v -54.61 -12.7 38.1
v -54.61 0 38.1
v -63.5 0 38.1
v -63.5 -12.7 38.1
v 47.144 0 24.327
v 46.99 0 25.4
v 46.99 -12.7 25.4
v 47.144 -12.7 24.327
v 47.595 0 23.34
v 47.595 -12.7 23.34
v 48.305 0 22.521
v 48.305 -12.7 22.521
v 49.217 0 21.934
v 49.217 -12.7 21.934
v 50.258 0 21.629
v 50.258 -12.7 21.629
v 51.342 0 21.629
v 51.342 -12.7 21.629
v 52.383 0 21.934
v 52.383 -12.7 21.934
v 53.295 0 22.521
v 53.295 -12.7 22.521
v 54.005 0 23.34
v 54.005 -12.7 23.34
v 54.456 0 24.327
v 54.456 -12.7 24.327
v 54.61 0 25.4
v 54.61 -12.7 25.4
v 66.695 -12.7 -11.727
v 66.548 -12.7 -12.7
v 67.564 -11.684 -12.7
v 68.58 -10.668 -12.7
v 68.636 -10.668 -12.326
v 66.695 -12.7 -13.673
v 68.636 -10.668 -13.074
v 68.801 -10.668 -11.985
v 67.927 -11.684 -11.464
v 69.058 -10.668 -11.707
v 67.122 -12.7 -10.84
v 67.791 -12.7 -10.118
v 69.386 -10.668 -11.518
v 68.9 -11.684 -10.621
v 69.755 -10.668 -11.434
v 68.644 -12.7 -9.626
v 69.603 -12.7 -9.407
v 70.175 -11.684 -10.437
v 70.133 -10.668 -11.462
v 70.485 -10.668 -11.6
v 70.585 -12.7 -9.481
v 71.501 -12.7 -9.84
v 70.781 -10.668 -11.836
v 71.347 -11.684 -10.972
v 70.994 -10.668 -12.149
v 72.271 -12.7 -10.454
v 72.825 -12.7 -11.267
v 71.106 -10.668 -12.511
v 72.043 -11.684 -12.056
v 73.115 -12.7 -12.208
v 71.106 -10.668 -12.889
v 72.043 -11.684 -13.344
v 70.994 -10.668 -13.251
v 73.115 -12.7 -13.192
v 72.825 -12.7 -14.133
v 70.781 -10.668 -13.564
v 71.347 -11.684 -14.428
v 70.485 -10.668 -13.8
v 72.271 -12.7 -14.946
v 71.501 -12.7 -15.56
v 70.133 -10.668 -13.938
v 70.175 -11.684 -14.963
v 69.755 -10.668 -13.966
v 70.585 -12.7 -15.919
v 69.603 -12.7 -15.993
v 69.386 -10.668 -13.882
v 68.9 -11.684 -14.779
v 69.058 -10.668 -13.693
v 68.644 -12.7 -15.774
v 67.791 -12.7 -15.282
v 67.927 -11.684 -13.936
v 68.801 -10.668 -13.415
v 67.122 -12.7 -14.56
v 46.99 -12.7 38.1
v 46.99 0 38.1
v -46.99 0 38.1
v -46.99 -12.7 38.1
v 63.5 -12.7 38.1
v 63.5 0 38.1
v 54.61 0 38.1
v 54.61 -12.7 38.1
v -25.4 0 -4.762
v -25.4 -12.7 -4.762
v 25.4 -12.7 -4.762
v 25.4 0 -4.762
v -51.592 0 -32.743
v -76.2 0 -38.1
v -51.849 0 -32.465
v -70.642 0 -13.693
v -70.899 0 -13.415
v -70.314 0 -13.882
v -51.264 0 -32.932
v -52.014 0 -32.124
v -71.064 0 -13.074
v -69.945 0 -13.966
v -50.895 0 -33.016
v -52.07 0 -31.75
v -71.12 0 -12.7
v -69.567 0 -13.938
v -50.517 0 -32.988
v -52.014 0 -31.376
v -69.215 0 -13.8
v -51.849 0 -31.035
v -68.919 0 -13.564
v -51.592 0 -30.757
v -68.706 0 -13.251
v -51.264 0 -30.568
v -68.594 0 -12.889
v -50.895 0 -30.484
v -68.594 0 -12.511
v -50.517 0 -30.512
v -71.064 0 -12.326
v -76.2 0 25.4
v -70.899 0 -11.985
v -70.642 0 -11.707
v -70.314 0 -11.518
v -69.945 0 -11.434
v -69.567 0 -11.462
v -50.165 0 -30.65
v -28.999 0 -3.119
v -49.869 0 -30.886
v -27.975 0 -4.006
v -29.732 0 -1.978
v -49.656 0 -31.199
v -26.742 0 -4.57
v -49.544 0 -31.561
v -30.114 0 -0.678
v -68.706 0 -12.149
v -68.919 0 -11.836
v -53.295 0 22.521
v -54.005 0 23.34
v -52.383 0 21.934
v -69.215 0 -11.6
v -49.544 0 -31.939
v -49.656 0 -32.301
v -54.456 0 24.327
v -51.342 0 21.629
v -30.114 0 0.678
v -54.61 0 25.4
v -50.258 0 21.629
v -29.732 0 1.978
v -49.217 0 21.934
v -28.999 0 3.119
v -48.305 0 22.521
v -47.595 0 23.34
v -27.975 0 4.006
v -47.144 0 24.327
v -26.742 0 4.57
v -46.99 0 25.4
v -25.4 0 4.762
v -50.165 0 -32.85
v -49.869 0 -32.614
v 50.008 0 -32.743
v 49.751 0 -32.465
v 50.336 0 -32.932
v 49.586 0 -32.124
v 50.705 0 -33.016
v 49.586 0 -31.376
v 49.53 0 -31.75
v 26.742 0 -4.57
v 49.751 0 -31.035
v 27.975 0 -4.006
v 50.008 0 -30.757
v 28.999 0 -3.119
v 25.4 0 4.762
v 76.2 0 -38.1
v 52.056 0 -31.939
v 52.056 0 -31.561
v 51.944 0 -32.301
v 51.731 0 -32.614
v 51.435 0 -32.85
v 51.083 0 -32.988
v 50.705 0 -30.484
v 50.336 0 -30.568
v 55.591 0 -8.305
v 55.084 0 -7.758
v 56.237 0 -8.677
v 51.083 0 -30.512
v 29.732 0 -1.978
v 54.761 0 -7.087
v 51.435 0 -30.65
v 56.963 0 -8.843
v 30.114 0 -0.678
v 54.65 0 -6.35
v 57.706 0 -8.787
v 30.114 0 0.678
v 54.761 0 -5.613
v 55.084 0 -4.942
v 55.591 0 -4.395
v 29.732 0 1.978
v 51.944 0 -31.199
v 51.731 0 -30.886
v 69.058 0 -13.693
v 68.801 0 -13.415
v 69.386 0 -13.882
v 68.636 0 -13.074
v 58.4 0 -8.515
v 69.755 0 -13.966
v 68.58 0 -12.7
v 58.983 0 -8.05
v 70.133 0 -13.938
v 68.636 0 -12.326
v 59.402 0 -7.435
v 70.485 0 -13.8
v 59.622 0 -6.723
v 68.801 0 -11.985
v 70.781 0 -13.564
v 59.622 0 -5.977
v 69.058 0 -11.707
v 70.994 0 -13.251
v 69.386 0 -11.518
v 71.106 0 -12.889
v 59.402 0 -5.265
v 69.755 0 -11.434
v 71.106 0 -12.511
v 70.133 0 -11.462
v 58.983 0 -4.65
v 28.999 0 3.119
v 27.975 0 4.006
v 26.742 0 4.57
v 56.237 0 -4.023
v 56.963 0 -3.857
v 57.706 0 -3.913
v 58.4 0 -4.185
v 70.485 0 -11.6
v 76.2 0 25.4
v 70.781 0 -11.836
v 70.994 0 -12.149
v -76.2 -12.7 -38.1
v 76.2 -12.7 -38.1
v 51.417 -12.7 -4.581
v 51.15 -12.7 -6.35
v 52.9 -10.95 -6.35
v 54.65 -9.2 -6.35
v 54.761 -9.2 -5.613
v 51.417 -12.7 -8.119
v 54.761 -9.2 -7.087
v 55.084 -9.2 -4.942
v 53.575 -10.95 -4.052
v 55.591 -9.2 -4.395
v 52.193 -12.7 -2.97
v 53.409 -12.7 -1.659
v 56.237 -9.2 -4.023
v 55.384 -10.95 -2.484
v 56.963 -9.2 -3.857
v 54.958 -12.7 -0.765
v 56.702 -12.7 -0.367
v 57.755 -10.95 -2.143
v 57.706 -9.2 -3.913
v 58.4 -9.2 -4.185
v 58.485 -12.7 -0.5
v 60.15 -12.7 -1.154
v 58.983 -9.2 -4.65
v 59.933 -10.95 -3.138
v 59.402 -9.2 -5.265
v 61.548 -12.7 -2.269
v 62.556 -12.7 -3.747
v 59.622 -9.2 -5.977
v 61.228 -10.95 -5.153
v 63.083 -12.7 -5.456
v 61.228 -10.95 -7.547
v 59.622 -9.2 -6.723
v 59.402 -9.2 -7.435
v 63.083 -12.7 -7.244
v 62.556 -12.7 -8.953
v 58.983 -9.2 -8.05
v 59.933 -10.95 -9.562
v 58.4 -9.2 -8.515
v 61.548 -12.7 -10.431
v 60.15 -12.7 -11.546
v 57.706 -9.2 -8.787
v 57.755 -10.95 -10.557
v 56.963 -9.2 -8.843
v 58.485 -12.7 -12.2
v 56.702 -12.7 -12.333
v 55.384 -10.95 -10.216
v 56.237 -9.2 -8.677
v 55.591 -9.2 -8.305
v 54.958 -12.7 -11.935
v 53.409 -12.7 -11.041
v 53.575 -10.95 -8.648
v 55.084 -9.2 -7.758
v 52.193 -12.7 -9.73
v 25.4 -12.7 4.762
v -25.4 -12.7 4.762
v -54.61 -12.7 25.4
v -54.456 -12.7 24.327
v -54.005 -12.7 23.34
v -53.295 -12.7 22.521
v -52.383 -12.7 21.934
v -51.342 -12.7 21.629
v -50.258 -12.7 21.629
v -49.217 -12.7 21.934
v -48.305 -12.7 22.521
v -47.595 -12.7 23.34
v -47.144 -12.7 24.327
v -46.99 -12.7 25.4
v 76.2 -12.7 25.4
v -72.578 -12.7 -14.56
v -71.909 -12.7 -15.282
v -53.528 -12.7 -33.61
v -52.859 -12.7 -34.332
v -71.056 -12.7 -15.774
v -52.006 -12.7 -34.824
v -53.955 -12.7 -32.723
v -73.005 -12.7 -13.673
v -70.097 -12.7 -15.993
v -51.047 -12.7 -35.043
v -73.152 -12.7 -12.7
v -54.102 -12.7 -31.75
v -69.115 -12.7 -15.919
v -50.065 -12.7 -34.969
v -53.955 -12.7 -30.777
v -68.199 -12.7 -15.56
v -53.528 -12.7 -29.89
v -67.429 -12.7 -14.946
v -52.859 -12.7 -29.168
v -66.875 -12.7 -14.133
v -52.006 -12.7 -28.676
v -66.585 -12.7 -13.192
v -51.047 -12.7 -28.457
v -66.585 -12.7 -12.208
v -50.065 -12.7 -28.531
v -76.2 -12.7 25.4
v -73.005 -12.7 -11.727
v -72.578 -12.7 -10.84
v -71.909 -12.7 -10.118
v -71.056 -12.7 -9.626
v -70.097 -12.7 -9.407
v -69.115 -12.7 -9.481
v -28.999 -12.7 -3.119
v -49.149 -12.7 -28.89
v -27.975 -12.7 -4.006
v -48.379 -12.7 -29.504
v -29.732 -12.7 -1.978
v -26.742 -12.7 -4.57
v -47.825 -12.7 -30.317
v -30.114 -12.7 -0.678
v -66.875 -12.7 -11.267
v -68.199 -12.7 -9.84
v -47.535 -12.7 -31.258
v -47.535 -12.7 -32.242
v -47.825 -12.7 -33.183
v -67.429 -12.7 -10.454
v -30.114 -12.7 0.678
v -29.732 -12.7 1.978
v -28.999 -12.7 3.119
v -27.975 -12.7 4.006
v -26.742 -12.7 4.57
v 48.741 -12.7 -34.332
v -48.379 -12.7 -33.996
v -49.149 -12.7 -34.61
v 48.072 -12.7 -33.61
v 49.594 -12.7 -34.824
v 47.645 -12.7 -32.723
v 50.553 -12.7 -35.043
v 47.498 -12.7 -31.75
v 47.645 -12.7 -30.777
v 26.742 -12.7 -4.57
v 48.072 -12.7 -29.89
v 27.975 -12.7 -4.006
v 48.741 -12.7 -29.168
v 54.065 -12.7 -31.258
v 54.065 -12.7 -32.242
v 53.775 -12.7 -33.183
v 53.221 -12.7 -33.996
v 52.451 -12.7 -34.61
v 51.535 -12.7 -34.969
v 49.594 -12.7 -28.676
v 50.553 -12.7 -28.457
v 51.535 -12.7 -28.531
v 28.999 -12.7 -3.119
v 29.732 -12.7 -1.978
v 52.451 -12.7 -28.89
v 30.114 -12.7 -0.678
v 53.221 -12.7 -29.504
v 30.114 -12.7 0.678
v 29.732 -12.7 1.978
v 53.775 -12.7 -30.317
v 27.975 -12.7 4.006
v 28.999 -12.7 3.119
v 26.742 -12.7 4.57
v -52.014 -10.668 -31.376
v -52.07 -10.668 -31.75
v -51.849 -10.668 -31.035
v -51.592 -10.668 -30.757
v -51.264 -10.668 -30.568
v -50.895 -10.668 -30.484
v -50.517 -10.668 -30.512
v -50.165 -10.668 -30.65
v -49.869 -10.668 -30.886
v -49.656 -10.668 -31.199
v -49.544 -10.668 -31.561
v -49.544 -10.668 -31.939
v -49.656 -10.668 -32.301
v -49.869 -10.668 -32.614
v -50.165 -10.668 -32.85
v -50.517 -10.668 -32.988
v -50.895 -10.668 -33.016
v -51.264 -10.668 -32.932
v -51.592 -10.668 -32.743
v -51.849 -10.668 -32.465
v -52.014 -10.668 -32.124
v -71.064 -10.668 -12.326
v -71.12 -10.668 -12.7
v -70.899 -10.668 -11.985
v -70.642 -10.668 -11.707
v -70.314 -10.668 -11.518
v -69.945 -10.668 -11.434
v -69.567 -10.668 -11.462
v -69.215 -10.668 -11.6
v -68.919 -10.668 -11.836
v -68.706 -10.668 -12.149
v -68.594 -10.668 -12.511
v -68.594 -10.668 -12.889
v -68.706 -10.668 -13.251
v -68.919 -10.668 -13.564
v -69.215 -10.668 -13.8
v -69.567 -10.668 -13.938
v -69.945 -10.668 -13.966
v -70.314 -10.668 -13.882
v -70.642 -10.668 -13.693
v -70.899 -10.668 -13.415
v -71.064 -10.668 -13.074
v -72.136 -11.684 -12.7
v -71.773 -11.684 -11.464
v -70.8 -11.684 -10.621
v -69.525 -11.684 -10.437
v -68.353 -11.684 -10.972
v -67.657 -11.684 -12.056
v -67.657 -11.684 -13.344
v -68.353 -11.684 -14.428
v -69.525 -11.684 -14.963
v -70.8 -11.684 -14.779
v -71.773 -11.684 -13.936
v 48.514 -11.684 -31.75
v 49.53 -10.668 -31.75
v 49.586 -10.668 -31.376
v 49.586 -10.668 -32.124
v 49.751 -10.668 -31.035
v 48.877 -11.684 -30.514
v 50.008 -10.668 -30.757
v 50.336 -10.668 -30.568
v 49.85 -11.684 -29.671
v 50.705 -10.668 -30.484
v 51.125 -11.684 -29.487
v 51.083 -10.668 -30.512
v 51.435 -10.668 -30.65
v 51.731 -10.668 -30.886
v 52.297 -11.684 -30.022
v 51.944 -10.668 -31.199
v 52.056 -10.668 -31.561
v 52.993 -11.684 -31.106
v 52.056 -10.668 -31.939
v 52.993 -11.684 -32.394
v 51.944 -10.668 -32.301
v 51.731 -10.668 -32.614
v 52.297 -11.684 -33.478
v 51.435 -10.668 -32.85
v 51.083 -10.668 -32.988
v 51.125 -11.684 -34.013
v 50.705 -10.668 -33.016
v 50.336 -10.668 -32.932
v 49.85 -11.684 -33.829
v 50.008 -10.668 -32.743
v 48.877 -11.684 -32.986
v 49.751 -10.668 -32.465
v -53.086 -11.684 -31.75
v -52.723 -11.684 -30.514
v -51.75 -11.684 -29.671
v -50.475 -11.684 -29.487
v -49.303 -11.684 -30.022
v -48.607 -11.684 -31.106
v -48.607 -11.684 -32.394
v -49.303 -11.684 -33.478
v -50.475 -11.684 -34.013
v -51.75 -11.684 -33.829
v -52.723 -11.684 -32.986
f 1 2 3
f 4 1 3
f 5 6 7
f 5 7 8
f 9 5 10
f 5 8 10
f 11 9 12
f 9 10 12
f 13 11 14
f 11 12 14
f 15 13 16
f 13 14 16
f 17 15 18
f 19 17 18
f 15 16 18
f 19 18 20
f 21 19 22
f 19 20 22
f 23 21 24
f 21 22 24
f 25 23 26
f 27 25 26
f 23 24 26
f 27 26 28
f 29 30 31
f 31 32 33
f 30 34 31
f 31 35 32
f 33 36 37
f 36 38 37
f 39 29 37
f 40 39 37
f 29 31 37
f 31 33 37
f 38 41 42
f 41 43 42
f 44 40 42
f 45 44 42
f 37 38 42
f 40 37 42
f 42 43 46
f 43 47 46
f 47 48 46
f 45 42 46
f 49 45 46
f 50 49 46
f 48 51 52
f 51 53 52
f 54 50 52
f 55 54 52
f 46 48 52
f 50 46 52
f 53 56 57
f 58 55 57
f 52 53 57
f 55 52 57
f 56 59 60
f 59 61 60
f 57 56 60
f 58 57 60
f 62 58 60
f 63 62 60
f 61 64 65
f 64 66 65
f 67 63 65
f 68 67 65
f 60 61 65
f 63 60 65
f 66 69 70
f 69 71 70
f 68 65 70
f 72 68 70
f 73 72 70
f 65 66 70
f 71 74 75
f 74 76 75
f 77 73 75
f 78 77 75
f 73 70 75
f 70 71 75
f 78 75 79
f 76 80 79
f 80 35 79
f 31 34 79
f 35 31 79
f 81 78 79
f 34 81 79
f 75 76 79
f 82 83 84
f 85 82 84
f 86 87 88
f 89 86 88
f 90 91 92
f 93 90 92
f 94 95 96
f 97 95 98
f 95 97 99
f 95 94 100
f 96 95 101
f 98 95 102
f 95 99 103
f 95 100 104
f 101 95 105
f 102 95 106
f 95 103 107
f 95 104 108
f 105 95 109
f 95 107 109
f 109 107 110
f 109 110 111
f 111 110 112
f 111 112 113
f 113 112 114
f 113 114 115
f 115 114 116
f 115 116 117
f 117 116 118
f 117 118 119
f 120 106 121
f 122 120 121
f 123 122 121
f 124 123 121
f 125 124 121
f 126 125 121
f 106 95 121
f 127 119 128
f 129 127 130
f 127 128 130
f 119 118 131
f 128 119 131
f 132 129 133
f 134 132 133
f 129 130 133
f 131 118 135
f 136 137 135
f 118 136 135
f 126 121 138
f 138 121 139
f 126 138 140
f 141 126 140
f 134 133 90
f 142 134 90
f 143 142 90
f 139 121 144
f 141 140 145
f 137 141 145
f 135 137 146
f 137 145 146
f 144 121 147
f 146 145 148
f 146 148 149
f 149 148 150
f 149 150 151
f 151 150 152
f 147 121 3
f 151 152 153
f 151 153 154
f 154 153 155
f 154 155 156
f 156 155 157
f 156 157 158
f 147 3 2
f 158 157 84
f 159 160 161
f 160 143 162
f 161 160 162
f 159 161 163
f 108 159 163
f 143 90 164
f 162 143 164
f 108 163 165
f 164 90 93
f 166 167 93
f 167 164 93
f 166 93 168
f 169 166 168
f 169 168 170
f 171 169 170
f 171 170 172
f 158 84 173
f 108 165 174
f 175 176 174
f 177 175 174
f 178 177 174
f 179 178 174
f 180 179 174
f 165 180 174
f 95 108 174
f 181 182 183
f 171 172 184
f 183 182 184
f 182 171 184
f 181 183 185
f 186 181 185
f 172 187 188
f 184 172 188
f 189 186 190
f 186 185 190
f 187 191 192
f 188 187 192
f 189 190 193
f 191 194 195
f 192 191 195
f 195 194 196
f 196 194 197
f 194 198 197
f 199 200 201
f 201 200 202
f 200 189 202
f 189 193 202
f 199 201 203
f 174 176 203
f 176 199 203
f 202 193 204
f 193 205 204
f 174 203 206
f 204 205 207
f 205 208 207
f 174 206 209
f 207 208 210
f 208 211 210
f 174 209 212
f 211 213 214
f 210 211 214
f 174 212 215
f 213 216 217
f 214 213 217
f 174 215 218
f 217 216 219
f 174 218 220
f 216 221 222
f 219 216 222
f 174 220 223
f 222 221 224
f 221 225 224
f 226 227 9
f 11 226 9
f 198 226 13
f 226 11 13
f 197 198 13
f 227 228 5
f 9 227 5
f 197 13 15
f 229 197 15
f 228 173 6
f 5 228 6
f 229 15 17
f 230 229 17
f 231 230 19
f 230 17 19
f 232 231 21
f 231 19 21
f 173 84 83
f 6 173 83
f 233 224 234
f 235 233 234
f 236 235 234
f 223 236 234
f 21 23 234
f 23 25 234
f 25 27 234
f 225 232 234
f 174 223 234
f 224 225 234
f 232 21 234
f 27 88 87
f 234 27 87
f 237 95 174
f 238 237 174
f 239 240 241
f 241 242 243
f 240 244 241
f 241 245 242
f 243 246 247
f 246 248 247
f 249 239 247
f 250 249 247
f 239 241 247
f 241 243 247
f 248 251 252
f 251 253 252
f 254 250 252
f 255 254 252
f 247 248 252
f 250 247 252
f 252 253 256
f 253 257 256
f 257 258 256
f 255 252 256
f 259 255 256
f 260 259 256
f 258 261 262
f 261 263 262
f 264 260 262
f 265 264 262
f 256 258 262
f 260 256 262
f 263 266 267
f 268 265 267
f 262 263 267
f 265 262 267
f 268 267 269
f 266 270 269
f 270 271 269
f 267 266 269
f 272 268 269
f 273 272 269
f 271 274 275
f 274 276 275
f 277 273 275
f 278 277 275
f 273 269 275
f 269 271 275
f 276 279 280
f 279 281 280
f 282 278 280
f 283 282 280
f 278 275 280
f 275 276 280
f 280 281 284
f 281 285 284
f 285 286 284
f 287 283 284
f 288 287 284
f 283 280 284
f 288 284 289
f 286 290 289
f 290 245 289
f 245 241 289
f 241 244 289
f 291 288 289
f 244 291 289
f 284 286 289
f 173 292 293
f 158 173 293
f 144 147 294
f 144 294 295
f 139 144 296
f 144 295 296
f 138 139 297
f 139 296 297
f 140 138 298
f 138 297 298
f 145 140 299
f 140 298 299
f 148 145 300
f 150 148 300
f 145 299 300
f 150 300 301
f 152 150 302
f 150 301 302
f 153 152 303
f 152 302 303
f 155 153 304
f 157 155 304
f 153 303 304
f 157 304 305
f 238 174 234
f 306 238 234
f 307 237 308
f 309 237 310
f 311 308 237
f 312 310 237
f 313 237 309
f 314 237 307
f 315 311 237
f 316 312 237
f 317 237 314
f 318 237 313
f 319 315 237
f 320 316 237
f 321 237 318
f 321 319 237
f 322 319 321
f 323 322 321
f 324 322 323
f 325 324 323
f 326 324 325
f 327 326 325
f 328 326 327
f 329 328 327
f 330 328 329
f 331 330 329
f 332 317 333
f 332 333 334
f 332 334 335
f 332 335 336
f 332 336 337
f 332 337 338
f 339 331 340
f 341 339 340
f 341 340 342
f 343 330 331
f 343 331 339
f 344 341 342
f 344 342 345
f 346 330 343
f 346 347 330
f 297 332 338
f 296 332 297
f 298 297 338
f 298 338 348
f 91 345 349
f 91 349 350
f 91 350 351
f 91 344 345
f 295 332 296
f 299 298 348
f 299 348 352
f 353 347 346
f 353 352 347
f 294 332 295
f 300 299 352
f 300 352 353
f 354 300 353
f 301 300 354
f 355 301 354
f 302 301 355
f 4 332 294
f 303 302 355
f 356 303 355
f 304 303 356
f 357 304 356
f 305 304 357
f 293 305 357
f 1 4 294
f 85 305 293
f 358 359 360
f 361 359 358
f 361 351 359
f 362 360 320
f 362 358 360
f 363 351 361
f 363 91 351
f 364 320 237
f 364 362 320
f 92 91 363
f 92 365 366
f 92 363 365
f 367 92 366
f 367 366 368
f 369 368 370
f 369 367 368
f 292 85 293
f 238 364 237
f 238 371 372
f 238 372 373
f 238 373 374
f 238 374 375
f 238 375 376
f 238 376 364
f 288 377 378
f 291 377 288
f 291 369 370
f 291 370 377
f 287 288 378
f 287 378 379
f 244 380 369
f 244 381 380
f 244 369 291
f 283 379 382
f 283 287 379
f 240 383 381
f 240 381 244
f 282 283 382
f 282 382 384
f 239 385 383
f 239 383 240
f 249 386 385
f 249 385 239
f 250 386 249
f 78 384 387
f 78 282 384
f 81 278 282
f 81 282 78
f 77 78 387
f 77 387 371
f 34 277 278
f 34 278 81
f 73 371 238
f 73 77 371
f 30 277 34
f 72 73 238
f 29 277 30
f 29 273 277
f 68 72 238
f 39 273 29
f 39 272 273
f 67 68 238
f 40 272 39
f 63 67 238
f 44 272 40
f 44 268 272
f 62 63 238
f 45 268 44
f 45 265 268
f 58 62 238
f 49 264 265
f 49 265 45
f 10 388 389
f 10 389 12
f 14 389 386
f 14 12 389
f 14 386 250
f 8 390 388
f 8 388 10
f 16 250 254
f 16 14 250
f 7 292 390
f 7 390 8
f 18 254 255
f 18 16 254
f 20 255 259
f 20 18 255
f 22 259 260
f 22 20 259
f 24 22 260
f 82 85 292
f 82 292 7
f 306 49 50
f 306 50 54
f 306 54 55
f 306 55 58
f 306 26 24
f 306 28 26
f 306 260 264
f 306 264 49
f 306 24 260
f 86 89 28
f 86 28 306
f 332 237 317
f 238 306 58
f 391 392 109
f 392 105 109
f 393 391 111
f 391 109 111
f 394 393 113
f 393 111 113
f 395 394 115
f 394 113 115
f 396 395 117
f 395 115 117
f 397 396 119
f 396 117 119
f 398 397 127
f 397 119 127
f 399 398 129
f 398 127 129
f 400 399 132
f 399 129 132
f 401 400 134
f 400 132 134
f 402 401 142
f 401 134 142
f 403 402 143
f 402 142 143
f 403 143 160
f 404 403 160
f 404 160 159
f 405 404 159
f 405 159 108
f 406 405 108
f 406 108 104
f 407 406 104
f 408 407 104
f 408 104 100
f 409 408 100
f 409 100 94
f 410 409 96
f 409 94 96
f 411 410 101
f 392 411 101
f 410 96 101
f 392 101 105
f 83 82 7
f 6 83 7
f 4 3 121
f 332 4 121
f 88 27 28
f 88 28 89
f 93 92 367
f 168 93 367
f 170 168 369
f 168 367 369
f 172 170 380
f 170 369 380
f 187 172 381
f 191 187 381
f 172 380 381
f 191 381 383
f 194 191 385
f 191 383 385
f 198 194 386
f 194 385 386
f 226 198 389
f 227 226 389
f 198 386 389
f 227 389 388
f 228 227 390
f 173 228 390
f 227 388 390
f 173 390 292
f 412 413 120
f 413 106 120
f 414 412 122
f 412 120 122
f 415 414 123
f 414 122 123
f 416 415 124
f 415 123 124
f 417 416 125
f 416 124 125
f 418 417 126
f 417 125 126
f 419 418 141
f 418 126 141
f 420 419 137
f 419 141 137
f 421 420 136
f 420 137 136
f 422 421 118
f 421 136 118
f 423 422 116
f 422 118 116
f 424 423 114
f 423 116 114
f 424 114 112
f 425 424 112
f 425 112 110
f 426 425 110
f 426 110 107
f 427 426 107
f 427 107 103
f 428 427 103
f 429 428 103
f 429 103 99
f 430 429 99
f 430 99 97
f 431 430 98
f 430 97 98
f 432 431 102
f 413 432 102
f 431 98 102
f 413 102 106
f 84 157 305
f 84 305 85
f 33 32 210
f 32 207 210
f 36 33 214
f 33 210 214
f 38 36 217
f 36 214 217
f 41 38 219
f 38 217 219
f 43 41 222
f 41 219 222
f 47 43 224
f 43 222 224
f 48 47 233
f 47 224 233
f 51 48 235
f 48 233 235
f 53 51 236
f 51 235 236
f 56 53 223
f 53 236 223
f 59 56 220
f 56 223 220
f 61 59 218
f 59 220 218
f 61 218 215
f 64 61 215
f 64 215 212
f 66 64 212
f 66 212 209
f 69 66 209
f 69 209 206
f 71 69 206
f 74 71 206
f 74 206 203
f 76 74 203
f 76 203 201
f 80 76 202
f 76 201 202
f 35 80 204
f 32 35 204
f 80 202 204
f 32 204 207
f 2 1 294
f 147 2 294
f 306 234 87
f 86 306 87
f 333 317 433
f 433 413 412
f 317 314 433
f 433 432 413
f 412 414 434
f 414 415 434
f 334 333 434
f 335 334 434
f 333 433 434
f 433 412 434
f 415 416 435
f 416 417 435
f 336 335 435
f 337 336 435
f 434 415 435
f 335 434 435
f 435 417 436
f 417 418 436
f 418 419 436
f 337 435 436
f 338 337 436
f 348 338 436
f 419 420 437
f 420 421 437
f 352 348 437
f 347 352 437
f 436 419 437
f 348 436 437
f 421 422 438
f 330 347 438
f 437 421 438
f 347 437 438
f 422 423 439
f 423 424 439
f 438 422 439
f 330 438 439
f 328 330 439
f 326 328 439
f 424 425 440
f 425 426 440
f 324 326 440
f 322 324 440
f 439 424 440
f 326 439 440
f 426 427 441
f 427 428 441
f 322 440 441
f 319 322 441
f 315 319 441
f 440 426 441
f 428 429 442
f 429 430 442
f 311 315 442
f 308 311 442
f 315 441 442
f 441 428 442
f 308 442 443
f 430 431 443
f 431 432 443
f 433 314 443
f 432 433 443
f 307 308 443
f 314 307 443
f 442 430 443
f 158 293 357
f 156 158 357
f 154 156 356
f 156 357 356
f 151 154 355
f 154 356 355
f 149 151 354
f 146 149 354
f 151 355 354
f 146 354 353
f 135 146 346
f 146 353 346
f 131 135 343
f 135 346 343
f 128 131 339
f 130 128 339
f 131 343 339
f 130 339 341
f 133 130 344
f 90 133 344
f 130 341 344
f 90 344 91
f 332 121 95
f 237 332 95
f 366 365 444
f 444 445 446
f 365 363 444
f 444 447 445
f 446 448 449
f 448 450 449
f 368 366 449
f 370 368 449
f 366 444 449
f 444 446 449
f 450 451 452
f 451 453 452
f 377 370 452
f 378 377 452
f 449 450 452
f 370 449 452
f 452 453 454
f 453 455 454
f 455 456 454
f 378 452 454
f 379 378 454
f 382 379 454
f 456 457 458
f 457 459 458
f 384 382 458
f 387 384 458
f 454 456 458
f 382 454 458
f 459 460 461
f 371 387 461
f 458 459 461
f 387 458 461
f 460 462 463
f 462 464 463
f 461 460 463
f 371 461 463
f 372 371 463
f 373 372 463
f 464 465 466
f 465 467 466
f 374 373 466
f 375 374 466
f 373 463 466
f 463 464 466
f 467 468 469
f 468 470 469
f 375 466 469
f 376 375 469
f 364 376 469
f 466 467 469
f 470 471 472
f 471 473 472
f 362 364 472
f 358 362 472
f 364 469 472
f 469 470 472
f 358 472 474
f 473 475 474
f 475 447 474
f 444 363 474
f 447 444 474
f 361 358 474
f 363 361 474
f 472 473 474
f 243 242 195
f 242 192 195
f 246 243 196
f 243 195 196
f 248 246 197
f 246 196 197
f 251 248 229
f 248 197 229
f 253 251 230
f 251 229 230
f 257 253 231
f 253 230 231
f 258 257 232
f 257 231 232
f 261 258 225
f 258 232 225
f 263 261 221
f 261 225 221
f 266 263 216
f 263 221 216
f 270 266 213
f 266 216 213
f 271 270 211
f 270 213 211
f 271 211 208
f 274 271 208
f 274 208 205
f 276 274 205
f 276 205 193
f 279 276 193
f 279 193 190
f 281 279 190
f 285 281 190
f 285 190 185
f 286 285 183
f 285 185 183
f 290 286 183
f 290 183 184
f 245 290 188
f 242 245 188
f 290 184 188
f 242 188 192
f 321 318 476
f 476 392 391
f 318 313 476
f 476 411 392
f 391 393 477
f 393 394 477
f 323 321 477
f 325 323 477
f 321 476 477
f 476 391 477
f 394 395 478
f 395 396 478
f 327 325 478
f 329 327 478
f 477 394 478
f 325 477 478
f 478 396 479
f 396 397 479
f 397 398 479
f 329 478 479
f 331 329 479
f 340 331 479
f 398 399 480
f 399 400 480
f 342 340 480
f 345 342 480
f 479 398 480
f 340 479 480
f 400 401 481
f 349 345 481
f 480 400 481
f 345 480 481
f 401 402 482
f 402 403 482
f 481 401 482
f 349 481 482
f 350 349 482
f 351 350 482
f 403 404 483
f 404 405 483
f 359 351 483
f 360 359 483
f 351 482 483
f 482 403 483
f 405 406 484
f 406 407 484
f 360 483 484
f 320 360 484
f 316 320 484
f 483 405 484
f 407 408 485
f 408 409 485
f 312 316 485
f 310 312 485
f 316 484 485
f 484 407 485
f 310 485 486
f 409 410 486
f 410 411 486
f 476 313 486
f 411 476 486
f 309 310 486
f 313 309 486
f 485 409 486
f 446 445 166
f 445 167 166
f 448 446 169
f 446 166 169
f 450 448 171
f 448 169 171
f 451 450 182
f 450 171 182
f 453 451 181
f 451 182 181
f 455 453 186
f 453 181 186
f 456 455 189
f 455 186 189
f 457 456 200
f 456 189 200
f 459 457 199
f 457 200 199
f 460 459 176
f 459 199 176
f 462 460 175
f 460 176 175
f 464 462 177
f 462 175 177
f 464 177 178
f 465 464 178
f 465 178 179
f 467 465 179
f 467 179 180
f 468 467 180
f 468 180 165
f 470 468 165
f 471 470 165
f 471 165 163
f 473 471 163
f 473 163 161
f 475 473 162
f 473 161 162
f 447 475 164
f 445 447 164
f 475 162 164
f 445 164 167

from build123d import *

# Parameters (mm, degrees)
F1_DEPTH       = 12.7
F3_DEPTH       = 12.701
F5_D           = 2.54
F5_CSINK_D     = 6.604
F5_CSINK_ANGLE = 90
F6_D           = 5
F6_CSINK_D     = 12
F6_CSINK_ANGLE = 90


with BuildPart() as f1:
    # F0 (on Front) → F1 (new body)
    with BuildSketch(Plane.XZ):
        Polygon((63.5, 38.1), (-63.5, 38.1), (-76.2, 25.4), (-76.2, -38.1), (76.2, -38.1), (76.2, 25.4), align=None)
    extrude(amount=F1_DEPTH)

    # F2 (on face) → F3 (cut, through all)
    with BuildSketch(Plane.XZ.offset(12.7)):
        with BuildLine():
            Line((-46.99, 38.1), (-54.61, 38.1))
            Line((-54.61, 38.1), (-54.61, 25.4))
            ThreePointArc((-54.61, 25.4), (-50.8, 21.59), (-46.99, 25.4))
            Line((-46.99, 25.4), (-46.99, 38.1))
        make_face()
        with BuildLine():
            Line((25.4, 4.7625), (0, 4.7625))
            Line((0, 4.7625), (-25.4, 4.7625))
            ThreePointArc((-25.4, 4.7625), (-30.1625, 0), (-25.4, -4.7625))
            Line((-25.4, -4.7625), (0, -4.7625))
            Line((0, -4.7625), (25.4, -4.7625))
            ThreePointArc((25.4, -4.7625), (30.1625, 0), (25.4, 4.7625))
        make_face()
        with BuildLine():
            Line((54.61, 38.1), (46.99, 38.1))
            Line((46.99, 38.1), (46.99, 25.4))
            ThreePointArc((46.99, 25.4), (50.8, 21.59), (54.61, 25.4))
            Line((54.61, 25.4), (54.61, 38.1))
        make_face()
    extrude(amount=-F3_DEPTH, mode=Mode.SUBTRACT)

    # F5 (through all)
    with Locations(Plane.XZ.offset(12.7)):
        with Locations((-69.85, -12.7), (-50.8, -31.75), (50.8, -31.75), (69.85, -12.7)):
            CounterSinkHole(F5_D / 2, F5_CSINK_D / 2, counter_sink_angle=F5_CSINK_ANGLE)

    # F6 (through all)
    with Locations(Plane.XZ.offset(12.7)):
        with Locations((57.15, -6.35)):
            CounterSinkHole(F6_D / 2, F6_CSINK_D / 2, counter_sink_angle=F6_CSINK_ANGLE)


solid = f1.part
